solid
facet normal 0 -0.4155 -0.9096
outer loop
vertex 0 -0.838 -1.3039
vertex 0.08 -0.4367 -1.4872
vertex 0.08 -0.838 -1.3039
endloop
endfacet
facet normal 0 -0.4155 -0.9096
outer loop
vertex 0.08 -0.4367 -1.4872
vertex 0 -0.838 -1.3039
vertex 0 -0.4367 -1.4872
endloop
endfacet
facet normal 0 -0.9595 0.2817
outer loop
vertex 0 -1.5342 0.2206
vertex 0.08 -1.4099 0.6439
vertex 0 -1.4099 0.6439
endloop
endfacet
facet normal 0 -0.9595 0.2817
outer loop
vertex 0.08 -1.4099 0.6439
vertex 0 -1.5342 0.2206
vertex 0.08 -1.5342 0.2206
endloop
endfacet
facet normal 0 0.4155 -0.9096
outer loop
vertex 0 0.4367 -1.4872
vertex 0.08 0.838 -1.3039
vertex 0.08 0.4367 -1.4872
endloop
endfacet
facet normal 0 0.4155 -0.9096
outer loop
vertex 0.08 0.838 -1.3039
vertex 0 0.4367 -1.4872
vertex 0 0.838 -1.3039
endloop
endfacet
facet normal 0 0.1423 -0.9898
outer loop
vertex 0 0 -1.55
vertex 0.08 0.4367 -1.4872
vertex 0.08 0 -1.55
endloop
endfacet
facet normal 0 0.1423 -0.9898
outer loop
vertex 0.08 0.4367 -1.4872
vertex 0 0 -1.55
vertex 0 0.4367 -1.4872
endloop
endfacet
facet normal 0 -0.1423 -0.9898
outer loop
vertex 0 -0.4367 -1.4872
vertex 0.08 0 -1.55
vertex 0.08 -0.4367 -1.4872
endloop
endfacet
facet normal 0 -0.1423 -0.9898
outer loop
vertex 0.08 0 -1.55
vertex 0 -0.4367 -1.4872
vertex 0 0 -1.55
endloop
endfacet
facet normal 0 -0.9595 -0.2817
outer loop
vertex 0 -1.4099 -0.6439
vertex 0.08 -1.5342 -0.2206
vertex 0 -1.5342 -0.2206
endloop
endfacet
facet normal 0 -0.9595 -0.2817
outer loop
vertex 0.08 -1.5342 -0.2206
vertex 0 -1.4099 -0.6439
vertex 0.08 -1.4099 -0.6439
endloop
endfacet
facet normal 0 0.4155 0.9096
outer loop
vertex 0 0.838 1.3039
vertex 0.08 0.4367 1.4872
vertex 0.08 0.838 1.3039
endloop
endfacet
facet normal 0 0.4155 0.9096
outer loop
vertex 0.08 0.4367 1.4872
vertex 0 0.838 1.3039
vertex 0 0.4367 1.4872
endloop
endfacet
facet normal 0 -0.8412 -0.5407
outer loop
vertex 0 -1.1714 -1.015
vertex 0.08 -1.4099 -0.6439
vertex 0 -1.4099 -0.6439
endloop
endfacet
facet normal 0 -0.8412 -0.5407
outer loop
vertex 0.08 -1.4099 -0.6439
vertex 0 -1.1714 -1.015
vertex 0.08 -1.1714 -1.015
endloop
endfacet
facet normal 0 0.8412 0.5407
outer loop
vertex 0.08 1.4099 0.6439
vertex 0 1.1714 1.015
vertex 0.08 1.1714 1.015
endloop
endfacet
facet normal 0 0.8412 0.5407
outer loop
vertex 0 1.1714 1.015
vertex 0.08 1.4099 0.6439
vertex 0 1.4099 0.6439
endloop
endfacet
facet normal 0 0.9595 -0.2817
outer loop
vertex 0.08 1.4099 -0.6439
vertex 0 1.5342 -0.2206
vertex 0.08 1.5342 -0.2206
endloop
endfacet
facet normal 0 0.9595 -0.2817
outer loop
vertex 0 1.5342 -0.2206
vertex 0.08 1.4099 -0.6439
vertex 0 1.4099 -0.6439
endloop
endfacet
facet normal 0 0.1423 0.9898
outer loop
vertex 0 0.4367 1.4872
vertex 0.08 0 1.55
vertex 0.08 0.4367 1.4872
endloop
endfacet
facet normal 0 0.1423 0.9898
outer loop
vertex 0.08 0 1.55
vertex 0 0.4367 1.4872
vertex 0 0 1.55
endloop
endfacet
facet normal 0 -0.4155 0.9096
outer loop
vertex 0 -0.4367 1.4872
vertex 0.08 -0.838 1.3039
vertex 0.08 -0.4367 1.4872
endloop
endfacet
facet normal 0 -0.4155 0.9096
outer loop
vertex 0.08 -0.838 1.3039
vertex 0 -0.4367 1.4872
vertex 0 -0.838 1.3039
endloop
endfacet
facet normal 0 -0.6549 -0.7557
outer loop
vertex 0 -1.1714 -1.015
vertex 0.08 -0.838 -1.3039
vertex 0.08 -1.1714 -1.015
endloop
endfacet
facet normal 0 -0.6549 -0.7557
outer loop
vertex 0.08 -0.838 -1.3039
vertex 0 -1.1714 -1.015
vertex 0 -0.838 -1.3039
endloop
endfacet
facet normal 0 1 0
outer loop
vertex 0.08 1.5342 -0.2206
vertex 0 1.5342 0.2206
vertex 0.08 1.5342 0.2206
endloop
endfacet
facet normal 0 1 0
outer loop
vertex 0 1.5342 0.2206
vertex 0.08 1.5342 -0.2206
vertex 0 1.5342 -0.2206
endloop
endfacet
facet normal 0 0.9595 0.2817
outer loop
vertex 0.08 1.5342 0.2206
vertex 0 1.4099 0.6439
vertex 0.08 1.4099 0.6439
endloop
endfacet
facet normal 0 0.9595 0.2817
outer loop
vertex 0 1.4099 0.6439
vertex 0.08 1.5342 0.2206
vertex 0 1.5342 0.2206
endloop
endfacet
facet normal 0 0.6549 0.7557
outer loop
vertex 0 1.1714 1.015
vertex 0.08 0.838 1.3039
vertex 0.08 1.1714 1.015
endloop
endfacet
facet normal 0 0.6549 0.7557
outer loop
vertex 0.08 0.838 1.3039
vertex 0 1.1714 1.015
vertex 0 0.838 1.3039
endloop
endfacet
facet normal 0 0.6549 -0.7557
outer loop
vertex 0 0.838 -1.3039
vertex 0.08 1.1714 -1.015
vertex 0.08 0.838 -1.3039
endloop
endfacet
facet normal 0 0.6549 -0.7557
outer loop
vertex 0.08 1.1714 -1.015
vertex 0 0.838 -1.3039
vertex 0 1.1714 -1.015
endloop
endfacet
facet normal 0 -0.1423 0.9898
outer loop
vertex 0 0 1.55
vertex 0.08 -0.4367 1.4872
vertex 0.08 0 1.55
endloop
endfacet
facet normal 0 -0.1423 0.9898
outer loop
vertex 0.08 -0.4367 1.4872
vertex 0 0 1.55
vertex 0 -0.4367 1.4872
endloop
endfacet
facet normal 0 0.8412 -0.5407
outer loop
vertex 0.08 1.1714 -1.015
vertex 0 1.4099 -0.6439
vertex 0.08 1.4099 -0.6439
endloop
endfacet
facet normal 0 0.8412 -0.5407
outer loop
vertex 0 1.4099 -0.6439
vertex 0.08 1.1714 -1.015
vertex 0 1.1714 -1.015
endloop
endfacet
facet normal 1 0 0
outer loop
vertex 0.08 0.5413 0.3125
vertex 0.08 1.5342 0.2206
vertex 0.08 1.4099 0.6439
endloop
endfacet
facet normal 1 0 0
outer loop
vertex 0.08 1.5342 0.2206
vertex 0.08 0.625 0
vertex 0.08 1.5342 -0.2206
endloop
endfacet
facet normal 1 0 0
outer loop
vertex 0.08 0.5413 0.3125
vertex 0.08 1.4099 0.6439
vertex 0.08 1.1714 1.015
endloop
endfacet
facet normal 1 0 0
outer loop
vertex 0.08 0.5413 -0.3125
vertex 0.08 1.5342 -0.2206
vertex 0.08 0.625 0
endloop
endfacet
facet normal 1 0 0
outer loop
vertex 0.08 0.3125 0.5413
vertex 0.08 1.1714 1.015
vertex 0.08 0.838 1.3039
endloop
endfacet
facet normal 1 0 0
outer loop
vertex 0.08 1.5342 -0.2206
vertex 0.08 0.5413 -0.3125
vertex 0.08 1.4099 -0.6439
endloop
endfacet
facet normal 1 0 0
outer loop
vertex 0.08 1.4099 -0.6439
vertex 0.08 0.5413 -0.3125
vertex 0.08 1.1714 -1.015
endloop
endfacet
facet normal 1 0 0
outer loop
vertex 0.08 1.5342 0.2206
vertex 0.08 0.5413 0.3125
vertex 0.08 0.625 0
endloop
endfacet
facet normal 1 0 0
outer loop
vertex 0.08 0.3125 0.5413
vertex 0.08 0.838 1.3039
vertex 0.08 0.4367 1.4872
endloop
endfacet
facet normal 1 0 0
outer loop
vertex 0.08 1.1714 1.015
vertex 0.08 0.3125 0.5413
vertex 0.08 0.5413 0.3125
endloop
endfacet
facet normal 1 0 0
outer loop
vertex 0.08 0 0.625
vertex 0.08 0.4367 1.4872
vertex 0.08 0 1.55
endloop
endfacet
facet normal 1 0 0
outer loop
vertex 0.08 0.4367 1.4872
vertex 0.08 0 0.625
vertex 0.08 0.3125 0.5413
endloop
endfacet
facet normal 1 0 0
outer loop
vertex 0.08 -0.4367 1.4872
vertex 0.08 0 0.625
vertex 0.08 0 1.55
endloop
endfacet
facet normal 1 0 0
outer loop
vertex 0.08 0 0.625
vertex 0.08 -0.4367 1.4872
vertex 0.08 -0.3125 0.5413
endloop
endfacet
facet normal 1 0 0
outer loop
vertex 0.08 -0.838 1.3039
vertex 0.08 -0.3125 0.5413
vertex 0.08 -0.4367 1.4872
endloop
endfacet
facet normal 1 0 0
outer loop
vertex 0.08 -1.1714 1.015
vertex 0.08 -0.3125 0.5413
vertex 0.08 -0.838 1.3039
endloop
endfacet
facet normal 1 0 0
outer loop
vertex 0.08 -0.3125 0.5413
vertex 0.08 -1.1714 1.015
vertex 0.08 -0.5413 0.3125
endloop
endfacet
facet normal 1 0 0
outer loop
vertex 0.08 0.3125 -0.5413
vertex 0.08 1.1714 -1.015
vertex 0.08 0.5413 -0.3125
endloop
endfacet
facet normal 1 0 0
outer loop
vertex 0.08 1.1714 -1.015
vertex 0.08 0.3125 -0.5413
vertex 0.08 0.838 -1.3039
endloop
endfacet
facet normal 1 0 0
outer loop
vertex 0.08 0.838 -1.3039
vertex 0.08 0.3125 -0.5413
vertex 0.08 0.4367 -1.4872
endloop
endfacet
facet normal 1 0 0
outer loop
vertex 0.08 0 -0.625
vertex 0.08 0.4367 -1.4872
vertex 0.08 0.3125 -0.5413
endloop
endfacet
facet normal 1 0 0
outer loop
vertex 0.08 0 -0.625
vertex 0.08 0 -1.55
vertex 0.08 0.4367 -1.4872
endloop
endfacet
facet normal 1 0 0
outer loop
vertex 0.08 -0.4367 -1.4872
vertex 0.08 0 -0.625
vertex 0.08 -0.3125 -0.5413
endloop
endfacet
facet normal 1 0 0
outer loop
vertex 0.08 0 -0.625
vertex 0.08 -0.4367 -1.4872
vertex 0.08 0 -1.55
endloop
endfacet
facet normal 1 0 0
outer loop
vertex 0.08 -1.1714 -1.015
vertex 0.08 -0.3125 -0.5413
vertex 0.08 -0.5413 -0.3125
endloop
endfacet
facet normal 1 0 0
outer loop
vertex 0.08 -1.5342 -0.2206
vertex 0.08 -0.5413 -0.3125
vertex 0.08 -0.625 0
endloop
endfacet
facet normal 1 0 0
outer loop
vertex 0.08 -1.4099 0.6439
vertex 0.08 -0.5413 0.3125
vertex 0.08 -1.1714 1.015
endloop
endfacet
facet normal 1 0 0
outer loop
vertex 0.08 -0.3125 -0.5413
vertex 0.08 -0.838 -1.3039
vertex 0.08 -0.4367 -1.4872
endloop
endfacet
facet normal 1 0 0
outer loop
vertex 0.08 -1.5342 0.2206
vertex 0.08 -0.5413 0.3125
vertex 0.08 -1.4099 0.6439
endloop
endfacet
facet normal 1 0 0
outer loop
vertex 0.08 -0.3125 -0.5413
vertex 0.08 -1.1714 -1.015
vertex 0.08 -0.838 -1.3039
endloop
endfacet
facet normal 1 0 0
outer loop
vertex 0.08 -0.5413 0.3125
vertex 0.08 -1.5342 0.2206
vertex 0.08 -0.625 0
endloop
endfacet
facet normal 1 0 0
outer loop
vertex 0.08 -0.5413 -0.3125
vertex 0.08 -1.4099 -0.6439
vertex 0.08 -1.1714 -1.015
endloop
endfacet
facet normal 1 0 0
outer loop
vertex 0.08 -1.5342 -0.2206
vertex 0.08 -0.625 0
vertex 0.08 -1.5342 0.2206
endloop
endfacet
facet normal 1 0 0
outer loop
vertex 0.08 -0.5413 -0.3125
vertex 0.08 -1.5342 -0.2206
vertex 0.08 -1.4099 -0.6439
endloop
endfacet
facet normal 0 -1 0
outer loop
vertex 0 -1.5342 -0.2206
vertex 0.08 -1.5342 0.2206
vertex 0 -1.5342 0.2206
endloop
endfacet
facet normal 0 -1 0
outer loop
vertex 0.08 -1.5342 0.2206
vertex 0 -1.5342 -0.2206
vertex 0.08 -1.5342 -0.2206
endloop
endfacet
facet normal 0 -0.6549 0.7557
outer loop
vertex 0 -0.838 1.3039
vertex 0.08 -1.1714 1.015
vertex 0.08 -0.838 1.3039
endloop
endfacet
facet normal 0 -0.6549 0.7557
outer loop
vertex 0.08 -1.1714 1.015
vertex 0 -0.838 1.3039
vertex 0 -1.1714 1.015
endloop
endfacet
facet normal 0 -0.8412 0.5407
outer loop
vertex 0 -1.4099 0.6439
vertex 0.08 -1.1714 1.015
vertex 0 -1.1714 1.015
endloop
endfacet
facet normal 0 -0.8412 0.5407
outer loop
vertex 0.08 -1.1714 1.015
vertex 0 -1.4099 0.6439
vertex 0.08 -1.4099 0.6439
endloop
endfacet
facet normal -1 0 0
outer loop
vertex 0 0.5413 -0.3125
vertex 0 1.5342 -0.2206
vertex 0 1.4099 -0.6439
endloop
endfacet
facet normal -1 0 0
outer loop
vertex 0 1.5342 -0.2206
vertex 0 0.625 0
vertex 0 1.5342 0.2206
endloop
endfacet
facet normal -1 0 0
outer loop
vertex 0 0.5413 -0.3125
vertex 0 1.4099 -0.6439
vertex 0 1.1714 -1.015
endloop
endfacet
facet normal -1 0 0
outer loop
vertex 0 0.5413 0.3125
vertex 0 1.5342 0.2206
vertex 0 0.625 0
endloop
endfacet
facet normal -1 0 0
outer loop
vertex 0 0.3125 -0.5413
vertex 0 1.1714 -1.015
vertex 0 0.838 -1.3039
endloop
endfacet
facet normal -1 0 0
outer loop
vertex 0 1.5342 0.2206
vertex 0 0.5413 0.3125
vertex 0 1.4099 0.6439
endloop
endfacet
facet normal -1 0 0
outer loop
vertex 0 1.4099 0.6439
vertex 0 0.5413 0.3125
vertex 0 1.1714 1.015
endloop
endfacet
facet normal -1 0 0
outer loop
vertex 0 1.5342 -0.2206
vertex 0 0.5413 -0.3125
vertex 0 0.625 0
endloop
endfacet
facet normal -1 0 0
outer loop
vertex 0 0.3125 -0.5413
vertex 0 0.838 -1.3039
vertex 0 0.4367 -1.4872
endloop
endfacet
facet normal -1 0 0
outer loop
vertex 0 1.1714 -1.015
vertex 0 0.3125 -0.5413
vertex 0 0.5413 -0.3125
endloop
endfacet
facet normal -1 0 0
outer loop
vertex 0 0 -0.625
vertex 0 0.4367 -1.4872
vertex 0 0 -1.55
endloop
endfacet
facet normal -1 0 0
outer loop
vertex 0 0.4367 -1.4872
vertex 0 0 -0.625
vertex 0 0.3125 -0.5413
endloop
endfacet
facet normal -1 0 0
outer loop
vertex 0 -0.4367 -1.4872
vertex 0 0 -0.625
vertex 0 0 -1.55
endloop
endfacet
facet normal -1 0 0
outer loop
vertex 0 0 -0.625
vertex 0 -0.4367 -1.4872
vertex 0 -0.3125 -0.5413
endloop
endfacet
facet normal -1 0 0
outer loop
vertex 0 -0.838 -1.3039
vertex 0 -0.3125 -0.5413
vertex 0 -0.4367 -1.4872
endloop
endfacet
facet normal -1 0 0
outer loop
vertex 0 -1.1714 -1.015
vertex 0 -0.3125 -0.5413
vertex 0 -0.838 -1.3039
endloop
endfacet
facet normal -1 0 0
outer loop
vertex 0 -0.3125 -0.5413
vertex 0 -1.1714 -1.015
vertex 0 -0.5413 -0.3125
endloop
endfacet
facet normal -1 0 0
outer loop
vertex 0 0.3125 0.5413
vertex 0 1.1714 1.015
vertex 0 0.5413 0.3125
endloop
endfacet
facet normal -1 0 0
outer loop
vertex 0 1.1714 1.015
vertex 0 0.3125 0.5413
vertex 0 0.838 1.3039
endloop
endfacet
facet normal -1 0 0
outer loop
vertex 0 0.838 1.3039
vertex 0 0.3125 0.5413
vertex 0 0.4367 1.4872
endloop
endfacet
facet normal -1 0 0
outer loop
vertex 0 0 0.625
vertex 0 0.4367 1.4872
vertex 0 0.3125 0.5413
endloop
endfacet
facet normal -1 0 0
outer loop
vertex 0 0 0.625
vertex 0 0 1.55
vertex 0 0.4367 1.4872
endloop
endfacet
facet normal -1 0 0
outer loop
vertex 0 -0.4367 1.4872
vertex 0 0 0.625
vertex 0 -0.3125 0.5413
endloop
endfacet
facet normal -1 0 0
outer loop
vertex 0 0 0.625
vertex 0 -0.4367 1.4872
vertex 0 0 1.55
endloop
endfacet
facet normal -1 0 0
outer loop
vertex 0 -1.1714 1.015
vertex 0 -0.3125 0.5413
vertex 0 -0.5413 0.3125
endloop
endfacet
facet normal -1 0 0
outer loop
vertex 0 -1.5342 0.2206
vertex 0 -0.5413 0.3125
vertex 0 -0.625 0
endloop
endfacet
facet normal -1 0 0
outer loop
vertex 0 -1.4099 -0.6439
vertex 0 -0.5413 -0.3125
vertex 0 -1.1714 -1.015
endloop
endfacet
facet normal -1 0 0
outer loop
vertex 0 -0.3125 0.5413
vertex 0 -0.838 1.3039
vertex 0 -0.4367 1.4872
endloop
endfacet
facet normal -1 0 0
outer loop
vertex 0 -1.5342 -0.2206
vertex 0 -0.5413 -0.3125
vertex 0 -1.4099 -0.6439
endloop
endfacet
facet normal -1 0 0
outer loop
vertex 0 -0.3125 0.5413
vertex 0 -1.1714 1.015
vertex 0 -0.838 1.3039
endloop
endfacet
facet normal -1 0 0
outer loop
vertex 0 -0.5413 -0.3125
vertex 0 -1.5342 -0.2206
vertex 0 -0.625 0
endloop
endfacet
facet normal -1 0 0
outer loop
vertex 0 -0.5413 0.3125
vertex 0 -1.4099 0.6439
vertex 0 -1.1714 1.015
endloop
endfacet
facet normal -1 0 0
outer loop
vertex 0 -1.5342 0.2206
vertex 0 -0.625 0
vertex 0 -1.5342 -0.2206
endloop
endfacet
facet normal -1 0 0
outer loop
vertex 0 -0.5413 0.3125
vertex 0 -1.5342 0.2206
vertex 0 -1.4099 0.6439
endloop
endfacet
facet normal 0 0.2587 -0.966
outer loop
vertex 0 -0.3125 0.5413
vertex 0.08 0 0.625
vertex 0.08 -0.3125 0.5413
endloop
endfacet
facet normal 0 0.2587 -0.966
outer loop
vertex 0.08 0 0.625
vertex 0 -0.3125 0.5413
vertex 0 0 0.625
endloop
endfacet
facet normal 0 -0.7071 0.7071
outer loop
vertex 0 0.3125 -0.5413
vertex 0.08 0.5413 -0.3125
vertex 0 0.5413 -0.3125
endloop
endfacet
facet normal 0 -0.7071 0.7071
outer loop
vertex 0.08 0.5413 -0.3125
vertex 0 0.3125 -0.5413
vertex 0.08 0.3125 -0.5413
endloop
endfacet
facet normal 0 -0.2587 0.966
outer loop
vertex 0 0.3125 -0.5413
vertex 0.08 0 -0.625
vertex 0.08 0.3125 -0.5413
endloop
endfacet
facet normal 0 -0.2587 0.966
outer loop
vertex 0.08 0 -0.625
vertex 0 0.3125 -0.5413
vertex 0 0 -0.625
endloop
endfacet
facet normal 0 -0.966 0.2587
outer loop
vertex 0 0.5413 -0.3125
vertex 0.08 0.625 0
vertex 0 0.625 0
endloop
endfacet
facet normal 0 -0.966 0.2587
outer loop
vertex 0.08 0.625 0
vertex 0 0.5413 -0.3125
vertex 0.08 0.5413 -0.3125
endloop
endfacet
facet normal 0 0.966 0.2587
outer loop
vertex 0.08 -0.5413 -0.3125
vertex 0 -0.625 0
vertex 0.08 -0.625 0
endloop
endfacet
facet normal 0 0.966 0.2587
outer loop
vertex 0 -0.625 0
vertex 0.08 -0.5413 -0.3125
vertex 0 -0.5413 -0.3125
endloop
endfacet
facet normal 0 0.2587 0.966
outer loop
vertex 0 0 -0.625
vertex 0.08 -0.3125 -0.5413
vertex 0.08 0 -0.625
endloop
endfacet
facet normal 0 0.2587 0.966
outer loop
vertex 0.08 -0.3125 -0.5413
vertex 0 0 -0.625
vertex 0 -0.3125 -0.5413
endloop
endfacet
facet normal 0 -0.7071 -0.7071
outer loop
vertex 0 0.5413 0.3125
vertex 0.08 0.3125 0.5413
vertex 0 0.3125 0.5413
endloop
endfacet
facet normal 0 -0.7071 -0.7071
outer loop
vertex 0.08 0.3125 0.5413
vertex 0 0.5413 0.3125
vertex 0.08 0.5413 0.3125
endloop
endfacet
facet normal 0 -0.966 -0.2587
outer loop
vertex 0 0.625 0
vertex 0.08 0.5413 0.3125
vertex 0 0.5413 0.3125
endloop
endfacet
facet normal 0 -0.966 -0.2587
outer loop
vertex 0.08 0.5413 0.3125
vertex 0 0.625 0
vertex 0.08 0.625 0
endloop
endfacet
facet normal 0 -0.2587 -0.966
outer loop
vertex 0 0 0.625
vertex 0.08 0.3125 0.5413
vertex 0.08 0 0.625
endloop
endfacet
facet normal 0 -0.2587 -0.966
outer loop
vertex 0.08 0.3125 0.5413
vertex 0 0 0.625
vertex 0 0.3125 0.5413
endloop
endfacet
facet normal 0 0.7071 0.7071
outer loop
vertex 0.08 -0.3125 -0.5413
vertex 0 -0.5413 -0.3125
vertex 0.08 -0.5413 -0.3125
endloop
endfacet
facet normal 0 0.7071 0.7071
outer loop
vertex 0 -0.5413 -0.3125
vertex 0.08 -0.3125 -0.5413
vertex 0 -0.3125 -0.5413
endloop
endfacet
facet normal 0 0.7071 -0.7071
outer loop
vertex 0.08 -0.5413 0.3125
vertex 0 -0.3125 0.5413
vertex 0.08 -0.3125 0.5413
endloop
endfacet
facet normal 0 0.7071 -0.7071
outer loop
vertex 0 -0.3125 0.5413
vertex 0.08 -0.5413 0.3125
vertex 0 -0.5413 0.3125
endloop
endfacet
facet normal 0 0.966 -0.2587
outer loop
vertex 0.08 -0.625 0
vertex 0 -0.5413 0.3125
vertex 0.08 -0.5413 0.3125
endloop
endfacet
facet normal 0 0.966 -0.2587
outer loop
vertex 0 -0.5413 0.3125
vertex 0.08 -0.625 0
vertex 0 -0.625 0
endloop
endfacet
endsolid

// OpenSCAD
module washer(rotation=0) 
{
    diameter = 3.1;
    thickness = 0.08;
    hole = 1.25;
 
    
    rotate([0,90,rotation]) 
    color([0.0,0.8,1.0])
    translate([0,0,thickness*0.5]) 
    {
        difference() {
            cylinder(h=thickness, r=diameter/2, $fn = 22, center=true);
            cylinder(h=thickness+0.1, r=hole/2, $fn = 12, center=true);
        }
    }
}

washer();
